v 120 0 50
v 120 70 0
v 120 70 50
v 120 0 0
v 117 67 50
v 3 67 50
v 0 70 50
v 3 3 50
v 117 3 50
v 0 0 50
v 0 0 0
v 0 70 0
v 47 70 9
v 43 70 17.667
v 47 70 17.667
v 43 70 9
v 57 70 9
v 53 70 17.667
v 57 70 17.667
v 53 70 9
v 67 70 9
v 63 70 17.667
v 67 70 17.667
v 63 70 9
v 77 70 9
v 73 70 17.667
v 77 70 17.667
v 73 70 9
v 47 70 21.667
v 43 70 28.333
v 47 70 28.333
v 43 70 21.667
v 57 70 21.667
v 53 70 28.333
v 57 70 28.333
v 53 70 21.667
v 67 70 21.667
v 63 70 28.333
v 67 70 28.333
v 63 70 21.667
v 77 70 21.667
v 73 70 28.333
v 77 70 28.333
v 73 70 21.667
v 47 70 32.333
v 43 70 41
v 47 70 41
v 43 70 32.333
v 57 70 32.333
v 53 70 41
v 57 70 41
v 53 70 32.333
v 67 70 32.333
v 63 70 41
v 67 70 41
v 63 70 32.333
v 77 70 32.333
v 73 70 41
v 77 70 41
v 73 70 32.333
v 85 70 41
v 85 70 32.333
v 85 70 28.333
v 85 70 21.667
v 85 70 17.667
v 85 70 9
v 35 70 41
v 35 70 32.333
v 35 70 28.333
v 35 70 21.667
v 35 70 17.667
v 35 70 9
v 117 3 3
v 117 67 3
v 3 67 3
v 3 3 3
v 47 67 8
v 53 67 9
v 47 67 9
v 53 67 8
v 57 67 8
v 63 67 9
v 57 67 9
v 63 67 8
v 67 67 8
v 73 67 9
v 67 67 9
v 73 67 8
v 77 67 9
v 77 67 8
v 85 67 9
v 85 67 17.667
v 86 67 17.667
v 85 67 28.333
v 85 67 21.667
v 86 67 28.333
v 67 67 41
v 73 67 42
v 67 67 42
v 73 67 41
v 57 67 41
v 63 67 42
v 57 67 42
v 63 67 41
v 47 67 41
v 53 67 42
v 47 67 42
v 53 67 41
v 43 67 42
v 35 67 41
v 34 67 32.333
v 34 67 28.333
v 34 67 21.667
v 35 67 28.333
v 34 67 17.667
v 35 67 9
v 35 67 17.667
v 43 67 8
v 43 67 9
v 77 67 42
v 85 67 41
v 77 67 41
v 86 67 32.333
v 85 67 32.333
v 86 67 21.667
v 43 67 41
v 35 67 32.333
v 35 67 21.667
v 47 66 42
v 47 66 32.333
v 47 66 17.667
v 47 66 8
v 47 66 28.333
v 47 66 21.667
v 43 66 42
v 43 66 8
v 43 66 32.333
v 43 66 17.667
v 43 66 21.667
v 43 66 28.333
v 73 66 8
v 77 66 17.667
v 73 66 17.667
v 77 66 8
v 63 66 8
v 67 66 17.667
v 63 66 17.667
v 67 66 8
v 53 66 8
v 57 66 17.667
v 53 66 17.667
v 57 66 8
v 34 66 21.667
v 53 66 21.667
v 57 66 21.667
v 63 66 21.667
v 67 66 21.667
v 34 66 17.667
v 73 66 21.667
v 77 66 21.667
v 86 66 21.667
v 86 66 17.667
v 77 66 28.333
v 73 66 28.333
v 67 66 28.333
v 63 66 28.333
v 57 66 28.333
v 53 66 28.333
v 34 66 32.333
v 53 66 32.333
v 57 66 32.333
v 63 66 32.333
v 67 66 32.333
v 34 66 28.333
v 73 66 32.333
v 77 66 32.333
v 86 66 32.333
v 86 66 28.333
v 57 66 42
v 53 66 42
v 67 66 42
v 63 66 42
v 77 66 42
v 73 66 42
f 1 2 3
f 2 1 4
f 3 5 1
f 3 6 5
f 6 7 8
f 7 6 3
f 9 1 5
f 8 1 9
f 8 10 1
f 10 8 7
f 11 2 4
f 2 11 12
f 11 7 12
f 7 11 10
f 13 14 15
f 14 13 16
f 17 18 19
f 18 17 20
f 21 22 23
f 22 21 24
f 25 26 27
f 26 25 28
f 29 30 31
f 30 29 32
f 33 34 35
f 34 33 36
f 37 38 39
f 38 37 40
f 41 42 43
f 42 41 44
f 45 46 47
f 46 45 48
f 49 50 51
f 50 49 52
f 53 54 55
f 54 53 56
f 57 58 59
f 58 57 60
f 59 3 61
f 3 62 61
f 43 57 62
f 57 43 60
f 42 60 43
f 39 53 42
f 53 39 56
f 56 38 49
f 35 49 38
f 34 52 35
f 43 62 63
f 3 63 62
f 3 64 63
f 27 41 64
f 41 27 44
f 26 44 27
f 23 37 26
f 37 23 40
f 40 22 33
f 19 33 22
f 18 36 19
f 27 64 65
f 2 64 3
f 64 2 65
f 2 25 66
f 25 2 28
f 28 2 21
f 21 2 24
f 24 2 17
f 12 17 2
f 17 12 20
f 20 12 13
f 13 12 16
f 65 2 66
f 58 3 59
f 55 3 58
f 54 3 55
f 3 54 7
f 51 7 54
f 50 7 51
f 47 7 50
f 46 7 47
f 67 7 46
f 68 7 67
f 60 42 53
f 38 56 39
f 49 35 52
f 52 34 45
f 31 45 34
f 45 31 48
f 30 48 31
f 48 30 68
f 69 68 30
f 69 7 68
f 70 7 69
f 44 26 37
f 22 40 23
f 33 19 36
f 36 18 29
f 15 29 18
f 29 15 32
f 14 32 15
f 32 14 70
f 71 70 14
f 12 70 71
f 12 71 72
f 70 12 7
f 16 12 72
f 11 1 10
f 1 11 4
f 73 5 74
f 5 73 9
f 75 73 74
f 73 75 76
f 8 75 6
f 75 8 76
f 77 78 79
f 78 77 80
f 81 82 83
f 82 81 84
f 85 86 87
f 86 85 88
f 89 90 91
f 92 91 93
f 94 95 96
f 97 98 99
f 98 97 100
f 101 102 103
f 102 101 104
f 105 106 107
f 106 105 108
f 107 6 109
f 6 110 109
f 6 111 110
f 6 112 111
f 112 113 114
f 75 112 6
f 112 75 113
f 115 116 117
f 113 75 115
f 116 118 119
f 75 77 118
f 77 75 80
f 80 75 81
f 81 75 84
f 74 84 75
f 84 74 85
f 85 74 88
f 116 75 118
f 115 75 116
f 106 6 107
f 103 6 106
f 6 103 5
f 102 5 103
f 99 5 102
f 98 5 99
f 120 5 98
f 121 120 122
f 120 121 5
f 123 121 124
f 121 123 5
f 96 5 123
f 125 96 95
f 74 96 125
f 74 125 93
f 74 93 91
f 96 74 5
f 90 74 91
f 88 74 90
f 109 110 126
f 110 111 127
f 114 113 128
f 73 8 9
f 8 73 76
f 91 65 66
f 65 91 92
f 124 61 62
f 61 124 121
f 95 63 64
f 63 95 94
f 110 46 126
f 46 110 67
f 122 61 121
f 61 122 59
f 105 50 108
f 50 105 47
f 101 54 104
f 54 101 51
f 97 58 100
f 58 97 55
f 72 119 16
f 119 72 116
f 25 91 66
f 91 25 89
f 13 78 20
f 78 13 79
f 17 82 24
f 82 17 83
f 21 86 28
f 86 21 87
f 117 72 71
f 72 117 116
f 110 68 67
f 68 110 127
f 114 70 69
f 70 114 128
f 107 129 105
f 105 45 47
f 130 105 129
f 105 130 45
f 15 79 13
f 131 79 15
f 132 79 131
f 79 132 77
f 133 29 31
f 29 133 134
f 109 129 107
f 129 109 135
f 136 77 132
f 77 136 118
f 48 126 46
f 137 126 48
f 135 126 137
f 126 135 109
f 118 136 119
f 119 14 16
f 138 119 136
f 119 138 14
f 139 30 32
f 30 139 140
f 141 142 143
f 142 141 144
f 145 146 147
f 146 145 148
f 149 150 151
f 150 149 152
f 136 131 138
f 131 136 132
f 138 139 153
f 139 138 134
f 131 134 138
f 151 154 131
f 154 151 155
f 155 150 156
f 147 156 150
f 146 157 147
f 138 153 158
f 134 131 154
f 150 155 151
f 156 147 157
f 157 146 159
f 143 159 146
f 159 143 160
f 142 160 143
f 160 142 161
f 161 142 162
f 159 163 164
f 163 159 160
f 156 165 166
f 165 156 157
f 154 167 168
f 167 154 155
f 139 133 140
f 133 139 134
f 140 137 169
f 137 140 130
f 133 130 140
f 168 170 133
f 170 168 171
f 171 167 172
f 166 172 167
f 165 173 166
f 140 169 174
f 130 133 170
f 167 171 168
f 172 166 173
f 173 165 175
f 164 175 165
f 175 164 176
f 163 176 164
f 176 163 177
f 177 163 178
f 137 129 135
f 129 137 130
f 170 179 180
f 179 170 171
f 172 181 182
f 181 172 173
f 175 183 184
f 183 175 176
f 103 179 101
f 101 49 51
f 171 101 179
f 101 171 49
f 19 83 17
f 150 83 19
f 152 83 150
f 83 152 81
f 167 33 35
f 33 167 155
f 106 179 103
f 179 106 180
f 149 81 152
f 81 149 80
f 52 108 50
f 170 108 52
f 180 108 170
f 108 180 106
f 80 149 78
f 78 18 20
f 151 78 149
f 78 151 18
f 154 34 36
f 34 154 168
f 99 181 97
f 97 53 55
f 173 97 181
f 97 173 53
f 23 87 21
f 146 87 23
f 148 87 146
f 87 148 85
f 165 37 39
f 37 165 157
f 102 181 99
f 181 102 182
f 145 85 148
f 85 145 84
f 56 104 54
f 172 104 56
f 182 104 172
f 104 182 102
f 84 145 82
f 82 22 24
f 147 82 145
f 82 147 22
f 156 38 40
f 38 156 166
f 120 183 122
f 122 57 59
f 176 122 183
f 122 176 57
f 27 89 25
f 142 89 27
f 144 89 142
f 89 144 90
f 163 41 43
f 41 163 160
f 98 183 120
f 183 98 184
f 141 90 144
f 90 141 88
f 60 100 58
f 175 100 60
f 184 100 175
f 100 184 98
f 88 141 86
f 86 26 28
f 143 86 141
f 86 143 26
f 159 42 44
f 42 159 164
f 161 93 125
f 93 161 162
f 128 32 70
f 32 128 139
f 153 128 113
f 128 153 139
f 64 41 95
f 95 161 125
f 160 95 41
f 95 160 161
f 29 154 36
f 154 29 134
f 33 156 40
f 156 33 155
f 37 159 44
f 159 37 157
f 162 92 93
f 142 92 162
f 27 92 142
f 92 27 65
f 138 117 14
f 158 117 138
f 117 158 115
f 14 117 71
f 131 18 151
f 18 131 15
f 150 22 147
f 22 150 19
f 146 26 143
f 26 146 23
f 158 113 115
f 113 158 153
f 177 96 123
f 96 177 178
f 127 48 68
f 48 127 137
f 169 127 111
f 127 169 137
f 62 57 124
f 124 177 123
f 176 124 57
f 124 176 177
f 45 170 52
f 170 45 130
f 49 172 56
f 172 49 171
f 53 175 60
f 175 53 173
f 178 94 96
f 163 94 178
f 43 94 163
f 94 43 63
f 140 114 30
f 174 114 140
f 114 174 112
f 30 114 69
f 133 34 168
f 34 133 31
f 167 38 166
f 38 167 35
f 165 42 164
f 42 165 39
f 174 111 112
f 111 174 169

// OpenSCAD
$fn = 32;

// ----------------------------------------------------------------------
// Vent box: crossgrid enclosure
// ----------------------------------------------------------------------

// --- parameters (mm) ---
box_l = 120;              // box length, X
box_w = 70;               // box width, Y
box_h = 50;               // box height, Z
wall_t = 3;               // shell wall thickness
win_l = 50;               // vent window width, X
win_h = 32;               // vent window height, Z
bar_w = 4;                // grid bar width
n_v = 4;                  // vertical bar count
n_h = 2;                  // horizontal bar count

win_z0 = (box_h - win_h) / 2;  // window lower edge Z
v_step = win_l / (n_v + 1);  // vertical bar step
h_step = win_h / (n_h + 1);  // horizontal bar step

difference() {
  union() {
    difference() {
      cube([box_l, box_w, box_h]);
  translate([wall_t, wall_t, wall_t])
    cube([box_l - 2 * wall_t, box_w - 2 * wall_t, box_h]);
  translate([(box_l - win_l) / 2, box_w - wall_t - 1, win_z0])
    cube([win_l, wall_t + 2, win_h]);
    }
    for (i = [1 : n_v])
      translate([(box_l - win_l) / 2 + i * v_step - bar_w / 2,
                 box_w - wall_t - 1, win_z0 - 1])
        cube([bar_w, wall_t + 1, win_h + 2]);
    for (i = [1 : n_h])
      translate([(box_l - win_l) / 2 - 1, box_w - wall_t - 1,
                 win_z0 + i * h_step - bar_w / 2])
        cube([win_l + 2, wall_t + 1, bar_w]);
  }
}
